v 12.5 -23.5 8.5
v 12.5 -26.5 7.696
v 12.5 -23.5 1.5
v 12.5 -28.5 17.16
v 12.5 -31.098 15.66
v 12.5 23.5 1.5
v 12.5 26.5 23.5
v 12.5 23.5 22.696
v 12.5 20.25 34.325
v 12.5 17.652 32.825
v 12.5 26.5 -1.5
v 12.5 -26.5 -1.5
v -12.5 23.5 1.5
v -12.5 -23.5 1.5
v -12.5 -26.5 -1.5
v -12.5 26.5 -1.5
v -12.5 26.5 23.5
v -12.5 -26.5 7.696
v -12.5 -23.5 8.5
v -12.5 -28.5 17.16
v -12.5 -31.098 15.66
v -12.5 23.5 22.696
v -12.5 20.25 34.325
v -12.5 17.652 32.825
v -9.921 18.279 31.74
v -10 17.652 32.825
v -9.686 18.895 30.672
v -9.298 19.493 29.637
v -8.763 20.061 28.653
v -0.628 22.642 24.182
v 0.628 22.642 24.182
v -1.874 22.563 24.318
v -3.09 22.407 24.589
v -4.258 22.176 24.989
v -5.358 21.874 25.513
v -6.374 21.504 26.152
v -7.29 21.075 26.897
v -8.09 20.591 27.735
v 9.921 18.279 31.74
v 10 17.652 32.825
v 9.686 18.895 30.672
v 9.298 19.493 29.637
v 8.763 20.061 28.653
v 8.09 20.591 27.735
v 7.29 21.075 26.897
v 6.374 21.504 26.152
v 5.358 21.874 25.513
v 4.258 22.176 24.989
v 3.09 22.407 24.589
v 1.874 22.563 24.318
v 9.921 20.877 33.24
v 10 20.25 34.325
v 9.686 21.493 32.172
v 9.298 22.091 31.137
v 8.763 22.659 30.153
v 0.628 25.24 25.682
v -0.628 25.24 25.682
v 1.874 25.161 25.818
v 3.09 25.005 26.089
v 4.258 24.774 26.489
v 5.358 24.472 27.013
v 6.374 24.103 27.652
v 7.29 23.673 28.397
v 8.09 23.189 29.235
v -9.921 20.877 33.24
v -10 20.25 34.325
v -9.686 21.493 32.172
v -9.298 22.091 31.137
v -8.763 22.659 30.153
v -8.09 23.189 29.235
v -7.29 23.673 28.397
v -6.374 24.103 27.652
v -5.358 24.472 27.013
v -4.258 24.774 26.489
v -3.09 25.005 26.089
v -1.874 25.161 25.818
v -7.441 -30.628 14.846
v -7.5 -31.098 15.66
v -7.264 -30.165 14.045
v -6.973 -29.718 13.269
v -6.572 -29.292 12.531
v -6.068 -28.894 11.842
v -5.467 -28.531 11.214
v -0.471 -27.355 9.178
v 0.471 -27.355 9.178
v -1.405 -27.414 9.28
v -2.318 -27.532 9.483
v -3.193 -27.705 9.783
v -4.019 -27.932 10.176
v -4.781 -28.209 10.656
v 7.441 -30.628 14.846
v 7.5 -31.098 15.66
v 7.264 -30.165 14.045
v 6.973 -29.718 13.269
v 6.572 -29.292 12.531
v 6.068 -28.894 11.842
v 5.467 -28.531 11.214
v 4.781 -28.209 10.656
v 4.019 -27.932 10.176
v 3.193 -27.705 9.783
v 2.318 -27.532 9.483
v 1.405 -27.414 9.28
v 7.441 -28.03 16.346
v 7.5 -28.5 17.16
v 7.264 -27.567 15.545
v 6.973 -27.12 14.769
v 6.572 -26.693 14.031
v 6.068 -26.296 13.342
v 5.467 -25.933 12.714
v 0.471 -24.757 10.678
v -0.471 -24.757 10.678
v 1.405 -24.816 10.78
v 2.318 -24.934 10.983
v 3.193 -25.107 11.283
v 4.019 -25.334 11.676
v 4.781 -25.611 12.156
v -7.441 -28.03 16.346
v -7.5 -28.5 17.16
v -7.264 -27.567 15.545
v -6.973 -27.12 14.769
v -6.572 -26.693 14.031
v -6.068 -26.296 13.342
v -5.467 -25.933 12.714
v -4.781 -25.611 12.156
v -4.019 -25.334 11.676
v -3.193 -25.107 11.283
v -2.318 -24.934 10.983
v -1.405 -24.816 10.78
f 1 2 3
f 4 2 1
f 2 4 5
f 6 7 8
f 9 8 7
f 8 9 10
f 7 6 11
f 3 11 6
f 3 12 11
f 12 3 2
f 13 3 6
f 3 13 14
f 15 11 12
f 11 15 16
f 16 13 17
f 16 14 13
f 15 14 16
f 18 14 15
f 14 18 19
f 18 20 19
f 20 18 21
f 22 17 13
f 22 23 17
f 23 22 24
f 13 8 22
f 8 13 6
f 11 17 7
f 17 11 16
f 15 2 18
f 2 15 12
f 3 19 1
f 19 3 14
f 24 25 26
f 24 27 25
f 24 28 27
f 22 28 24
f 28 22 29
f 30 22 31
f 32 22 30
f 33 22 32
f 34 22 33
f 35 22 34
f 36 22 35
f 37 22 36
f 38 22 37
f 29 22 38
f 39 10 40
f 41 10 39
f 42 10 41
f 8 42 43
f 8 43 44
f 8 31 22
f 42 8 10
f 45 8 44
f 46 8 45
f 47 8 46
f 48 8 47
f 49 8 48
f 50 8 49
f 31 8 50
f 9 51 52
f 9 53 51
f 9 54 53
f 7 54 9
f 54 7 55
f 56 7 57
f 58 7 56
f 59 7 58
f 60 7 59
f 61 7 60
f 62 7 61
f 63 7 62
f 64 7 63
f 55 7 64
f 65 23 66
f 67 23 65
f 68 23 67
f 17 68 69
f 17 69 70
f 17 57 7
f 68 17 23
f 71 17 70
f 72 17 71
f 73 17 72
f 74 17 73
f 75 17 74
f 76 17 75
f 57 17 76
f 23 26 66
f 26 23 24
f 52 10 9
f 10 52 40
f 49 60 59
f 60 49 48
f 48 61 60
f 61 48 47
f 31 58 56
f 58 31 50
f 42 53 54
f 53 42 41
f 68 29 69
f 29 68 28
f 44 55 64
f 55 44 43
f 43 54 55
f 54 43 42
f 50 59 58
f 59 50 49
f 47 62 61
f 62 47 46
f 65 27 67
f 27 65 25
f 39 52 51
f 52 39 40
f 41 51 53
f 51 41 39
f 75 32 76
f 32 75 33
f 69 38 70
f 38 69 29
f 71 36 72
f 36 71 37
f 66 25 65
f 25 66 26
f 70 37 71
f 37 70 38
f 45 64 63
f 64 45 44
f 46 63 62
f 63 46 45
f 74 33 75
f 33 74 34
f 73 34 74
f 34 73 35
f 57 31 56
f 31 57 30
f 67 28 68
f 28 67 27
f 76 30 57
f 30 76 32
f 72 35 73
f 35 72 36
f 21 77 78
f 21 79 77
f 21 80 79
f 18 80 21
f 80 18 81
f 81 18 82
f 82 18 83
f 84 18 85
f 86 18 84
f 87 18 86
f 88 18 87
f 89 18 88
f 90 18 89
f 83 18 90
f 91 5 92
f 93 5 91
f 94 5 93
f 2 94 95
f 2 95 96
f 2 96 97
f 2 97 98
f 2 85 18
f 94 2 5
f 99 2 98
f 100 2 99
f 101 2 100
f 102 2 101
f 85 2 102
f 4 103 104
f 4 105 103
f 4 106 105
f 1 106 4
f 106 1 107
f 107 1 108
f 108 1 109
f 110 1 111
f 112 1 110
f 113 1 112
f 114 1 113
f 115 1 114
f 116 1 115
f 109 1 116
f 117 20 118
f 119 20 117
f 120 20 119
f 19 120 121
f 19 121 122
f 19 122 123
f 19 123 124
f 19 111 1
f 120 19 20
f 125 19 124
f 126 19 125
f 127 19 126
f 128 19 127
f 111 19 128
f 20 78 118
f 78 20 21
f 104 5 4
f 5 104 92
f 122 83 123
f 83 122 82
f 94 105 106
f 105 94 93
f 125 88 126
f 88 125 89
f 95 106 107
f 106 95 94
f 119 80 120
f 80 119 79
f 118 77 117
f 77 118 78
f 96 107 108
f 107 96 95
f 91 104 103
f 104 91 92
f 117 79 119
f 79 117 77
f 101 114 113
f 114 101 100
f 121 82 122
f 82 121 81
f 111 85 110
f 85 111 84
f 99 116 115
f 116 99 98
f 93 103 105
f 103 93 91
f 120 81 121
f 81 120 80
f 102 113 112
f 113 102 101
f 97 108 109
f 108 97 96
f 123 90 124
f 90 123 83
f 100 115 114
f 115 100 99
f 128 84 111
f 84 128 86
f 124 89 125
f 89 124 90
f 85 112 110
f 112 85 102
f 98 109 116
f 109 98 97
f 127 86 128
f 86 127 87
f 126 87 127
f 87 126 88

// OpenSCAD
lengthOverall = 50; //Overall length of part
widthOverall = 25; //Width of part
partThickness = 3; //Thickness
partAngle = 60; //Angles between 0 and 90 degrees
mainWallHeight = 25; //Height of main vertical wall
secondWallScale = 0.4; //Height of second vertical wall % of main wall
ironMajorDiameter = 20; //diameter of soldering iron grip near the hot end
ironMinorDiameter = 15; //diameter of soldering iron grip near electrical cord

module SolderStand(thickness,Width, Length,Height, smallWallScale, Angle,Diameter, minorDiameter){
    
    
    Angle = 180-Angle;
    echo(Angle);
    //Check to ensure a valid angle has been entered
    if ((Angle>=90) && (Angle <=180)){
    secondWallHeight = Height*smallWallScale;
    echo(secondWallHeight);
    union(){
    union(){
    union(){
    //Base of Stand       
    cube(size=[Width,Length,thickness], center=true);
    //Tall Side Wall    
    translate([0, Length*0.5,Height*0.5-thickness*0.5]){
        rotate([90,0,0]){
            cube(size=[Width,Height,thickness], center=true);
        }
    }
    }
    
    //Short Side Wall 
    translate([0,-(Length*0.5),secondWallHeight*0.5-thickness*0.5]){
        rotate([90,0,0]){
        cube(size=[Width, secondWallHeight, thickness], center=true);
        }
    }
    }
    //Top Soldering Iron Rest   
    translate([-Width*0.5,Length*0.5+thickness*0.5, Height-thickness*0.5]){
        rotate([Angle,0,0])
        {
        difference(){
        cube(size=[Width, Height*0.5, thickness]);
        translate([Width*0.5,Height*0.5,0]){
        cylinder(r=Diameter*0.5,h=thickness);
        }
        }
        }
    }
    //Bottom Soldering Iron Rest
    translate([-Width*0.5, -(Length*0.5)+thickness*0.5,secondWallHeight-thickness*0.5]){
        rotate([Angle,0,0]){
            difference(){
            cube(size=[Width, secondWallHeight, thickness]);
            
            
            translate([Width*0.5,secondWallHeight,0]){
            cylinder(r=minorDiameter*0.5,h=thickness);
            }
            }
            
        }
    }
    }
    }
    //Error message if valid angle not entered
    else
    {
        echo("Use valid angle");
        }
}

SolderStand(partThickness,widthOverall, lengthOverall, mainWallHeight, secondWallScale, partAngle, ironMajorDiameter, ironMinorDiameter, $fn=50);
